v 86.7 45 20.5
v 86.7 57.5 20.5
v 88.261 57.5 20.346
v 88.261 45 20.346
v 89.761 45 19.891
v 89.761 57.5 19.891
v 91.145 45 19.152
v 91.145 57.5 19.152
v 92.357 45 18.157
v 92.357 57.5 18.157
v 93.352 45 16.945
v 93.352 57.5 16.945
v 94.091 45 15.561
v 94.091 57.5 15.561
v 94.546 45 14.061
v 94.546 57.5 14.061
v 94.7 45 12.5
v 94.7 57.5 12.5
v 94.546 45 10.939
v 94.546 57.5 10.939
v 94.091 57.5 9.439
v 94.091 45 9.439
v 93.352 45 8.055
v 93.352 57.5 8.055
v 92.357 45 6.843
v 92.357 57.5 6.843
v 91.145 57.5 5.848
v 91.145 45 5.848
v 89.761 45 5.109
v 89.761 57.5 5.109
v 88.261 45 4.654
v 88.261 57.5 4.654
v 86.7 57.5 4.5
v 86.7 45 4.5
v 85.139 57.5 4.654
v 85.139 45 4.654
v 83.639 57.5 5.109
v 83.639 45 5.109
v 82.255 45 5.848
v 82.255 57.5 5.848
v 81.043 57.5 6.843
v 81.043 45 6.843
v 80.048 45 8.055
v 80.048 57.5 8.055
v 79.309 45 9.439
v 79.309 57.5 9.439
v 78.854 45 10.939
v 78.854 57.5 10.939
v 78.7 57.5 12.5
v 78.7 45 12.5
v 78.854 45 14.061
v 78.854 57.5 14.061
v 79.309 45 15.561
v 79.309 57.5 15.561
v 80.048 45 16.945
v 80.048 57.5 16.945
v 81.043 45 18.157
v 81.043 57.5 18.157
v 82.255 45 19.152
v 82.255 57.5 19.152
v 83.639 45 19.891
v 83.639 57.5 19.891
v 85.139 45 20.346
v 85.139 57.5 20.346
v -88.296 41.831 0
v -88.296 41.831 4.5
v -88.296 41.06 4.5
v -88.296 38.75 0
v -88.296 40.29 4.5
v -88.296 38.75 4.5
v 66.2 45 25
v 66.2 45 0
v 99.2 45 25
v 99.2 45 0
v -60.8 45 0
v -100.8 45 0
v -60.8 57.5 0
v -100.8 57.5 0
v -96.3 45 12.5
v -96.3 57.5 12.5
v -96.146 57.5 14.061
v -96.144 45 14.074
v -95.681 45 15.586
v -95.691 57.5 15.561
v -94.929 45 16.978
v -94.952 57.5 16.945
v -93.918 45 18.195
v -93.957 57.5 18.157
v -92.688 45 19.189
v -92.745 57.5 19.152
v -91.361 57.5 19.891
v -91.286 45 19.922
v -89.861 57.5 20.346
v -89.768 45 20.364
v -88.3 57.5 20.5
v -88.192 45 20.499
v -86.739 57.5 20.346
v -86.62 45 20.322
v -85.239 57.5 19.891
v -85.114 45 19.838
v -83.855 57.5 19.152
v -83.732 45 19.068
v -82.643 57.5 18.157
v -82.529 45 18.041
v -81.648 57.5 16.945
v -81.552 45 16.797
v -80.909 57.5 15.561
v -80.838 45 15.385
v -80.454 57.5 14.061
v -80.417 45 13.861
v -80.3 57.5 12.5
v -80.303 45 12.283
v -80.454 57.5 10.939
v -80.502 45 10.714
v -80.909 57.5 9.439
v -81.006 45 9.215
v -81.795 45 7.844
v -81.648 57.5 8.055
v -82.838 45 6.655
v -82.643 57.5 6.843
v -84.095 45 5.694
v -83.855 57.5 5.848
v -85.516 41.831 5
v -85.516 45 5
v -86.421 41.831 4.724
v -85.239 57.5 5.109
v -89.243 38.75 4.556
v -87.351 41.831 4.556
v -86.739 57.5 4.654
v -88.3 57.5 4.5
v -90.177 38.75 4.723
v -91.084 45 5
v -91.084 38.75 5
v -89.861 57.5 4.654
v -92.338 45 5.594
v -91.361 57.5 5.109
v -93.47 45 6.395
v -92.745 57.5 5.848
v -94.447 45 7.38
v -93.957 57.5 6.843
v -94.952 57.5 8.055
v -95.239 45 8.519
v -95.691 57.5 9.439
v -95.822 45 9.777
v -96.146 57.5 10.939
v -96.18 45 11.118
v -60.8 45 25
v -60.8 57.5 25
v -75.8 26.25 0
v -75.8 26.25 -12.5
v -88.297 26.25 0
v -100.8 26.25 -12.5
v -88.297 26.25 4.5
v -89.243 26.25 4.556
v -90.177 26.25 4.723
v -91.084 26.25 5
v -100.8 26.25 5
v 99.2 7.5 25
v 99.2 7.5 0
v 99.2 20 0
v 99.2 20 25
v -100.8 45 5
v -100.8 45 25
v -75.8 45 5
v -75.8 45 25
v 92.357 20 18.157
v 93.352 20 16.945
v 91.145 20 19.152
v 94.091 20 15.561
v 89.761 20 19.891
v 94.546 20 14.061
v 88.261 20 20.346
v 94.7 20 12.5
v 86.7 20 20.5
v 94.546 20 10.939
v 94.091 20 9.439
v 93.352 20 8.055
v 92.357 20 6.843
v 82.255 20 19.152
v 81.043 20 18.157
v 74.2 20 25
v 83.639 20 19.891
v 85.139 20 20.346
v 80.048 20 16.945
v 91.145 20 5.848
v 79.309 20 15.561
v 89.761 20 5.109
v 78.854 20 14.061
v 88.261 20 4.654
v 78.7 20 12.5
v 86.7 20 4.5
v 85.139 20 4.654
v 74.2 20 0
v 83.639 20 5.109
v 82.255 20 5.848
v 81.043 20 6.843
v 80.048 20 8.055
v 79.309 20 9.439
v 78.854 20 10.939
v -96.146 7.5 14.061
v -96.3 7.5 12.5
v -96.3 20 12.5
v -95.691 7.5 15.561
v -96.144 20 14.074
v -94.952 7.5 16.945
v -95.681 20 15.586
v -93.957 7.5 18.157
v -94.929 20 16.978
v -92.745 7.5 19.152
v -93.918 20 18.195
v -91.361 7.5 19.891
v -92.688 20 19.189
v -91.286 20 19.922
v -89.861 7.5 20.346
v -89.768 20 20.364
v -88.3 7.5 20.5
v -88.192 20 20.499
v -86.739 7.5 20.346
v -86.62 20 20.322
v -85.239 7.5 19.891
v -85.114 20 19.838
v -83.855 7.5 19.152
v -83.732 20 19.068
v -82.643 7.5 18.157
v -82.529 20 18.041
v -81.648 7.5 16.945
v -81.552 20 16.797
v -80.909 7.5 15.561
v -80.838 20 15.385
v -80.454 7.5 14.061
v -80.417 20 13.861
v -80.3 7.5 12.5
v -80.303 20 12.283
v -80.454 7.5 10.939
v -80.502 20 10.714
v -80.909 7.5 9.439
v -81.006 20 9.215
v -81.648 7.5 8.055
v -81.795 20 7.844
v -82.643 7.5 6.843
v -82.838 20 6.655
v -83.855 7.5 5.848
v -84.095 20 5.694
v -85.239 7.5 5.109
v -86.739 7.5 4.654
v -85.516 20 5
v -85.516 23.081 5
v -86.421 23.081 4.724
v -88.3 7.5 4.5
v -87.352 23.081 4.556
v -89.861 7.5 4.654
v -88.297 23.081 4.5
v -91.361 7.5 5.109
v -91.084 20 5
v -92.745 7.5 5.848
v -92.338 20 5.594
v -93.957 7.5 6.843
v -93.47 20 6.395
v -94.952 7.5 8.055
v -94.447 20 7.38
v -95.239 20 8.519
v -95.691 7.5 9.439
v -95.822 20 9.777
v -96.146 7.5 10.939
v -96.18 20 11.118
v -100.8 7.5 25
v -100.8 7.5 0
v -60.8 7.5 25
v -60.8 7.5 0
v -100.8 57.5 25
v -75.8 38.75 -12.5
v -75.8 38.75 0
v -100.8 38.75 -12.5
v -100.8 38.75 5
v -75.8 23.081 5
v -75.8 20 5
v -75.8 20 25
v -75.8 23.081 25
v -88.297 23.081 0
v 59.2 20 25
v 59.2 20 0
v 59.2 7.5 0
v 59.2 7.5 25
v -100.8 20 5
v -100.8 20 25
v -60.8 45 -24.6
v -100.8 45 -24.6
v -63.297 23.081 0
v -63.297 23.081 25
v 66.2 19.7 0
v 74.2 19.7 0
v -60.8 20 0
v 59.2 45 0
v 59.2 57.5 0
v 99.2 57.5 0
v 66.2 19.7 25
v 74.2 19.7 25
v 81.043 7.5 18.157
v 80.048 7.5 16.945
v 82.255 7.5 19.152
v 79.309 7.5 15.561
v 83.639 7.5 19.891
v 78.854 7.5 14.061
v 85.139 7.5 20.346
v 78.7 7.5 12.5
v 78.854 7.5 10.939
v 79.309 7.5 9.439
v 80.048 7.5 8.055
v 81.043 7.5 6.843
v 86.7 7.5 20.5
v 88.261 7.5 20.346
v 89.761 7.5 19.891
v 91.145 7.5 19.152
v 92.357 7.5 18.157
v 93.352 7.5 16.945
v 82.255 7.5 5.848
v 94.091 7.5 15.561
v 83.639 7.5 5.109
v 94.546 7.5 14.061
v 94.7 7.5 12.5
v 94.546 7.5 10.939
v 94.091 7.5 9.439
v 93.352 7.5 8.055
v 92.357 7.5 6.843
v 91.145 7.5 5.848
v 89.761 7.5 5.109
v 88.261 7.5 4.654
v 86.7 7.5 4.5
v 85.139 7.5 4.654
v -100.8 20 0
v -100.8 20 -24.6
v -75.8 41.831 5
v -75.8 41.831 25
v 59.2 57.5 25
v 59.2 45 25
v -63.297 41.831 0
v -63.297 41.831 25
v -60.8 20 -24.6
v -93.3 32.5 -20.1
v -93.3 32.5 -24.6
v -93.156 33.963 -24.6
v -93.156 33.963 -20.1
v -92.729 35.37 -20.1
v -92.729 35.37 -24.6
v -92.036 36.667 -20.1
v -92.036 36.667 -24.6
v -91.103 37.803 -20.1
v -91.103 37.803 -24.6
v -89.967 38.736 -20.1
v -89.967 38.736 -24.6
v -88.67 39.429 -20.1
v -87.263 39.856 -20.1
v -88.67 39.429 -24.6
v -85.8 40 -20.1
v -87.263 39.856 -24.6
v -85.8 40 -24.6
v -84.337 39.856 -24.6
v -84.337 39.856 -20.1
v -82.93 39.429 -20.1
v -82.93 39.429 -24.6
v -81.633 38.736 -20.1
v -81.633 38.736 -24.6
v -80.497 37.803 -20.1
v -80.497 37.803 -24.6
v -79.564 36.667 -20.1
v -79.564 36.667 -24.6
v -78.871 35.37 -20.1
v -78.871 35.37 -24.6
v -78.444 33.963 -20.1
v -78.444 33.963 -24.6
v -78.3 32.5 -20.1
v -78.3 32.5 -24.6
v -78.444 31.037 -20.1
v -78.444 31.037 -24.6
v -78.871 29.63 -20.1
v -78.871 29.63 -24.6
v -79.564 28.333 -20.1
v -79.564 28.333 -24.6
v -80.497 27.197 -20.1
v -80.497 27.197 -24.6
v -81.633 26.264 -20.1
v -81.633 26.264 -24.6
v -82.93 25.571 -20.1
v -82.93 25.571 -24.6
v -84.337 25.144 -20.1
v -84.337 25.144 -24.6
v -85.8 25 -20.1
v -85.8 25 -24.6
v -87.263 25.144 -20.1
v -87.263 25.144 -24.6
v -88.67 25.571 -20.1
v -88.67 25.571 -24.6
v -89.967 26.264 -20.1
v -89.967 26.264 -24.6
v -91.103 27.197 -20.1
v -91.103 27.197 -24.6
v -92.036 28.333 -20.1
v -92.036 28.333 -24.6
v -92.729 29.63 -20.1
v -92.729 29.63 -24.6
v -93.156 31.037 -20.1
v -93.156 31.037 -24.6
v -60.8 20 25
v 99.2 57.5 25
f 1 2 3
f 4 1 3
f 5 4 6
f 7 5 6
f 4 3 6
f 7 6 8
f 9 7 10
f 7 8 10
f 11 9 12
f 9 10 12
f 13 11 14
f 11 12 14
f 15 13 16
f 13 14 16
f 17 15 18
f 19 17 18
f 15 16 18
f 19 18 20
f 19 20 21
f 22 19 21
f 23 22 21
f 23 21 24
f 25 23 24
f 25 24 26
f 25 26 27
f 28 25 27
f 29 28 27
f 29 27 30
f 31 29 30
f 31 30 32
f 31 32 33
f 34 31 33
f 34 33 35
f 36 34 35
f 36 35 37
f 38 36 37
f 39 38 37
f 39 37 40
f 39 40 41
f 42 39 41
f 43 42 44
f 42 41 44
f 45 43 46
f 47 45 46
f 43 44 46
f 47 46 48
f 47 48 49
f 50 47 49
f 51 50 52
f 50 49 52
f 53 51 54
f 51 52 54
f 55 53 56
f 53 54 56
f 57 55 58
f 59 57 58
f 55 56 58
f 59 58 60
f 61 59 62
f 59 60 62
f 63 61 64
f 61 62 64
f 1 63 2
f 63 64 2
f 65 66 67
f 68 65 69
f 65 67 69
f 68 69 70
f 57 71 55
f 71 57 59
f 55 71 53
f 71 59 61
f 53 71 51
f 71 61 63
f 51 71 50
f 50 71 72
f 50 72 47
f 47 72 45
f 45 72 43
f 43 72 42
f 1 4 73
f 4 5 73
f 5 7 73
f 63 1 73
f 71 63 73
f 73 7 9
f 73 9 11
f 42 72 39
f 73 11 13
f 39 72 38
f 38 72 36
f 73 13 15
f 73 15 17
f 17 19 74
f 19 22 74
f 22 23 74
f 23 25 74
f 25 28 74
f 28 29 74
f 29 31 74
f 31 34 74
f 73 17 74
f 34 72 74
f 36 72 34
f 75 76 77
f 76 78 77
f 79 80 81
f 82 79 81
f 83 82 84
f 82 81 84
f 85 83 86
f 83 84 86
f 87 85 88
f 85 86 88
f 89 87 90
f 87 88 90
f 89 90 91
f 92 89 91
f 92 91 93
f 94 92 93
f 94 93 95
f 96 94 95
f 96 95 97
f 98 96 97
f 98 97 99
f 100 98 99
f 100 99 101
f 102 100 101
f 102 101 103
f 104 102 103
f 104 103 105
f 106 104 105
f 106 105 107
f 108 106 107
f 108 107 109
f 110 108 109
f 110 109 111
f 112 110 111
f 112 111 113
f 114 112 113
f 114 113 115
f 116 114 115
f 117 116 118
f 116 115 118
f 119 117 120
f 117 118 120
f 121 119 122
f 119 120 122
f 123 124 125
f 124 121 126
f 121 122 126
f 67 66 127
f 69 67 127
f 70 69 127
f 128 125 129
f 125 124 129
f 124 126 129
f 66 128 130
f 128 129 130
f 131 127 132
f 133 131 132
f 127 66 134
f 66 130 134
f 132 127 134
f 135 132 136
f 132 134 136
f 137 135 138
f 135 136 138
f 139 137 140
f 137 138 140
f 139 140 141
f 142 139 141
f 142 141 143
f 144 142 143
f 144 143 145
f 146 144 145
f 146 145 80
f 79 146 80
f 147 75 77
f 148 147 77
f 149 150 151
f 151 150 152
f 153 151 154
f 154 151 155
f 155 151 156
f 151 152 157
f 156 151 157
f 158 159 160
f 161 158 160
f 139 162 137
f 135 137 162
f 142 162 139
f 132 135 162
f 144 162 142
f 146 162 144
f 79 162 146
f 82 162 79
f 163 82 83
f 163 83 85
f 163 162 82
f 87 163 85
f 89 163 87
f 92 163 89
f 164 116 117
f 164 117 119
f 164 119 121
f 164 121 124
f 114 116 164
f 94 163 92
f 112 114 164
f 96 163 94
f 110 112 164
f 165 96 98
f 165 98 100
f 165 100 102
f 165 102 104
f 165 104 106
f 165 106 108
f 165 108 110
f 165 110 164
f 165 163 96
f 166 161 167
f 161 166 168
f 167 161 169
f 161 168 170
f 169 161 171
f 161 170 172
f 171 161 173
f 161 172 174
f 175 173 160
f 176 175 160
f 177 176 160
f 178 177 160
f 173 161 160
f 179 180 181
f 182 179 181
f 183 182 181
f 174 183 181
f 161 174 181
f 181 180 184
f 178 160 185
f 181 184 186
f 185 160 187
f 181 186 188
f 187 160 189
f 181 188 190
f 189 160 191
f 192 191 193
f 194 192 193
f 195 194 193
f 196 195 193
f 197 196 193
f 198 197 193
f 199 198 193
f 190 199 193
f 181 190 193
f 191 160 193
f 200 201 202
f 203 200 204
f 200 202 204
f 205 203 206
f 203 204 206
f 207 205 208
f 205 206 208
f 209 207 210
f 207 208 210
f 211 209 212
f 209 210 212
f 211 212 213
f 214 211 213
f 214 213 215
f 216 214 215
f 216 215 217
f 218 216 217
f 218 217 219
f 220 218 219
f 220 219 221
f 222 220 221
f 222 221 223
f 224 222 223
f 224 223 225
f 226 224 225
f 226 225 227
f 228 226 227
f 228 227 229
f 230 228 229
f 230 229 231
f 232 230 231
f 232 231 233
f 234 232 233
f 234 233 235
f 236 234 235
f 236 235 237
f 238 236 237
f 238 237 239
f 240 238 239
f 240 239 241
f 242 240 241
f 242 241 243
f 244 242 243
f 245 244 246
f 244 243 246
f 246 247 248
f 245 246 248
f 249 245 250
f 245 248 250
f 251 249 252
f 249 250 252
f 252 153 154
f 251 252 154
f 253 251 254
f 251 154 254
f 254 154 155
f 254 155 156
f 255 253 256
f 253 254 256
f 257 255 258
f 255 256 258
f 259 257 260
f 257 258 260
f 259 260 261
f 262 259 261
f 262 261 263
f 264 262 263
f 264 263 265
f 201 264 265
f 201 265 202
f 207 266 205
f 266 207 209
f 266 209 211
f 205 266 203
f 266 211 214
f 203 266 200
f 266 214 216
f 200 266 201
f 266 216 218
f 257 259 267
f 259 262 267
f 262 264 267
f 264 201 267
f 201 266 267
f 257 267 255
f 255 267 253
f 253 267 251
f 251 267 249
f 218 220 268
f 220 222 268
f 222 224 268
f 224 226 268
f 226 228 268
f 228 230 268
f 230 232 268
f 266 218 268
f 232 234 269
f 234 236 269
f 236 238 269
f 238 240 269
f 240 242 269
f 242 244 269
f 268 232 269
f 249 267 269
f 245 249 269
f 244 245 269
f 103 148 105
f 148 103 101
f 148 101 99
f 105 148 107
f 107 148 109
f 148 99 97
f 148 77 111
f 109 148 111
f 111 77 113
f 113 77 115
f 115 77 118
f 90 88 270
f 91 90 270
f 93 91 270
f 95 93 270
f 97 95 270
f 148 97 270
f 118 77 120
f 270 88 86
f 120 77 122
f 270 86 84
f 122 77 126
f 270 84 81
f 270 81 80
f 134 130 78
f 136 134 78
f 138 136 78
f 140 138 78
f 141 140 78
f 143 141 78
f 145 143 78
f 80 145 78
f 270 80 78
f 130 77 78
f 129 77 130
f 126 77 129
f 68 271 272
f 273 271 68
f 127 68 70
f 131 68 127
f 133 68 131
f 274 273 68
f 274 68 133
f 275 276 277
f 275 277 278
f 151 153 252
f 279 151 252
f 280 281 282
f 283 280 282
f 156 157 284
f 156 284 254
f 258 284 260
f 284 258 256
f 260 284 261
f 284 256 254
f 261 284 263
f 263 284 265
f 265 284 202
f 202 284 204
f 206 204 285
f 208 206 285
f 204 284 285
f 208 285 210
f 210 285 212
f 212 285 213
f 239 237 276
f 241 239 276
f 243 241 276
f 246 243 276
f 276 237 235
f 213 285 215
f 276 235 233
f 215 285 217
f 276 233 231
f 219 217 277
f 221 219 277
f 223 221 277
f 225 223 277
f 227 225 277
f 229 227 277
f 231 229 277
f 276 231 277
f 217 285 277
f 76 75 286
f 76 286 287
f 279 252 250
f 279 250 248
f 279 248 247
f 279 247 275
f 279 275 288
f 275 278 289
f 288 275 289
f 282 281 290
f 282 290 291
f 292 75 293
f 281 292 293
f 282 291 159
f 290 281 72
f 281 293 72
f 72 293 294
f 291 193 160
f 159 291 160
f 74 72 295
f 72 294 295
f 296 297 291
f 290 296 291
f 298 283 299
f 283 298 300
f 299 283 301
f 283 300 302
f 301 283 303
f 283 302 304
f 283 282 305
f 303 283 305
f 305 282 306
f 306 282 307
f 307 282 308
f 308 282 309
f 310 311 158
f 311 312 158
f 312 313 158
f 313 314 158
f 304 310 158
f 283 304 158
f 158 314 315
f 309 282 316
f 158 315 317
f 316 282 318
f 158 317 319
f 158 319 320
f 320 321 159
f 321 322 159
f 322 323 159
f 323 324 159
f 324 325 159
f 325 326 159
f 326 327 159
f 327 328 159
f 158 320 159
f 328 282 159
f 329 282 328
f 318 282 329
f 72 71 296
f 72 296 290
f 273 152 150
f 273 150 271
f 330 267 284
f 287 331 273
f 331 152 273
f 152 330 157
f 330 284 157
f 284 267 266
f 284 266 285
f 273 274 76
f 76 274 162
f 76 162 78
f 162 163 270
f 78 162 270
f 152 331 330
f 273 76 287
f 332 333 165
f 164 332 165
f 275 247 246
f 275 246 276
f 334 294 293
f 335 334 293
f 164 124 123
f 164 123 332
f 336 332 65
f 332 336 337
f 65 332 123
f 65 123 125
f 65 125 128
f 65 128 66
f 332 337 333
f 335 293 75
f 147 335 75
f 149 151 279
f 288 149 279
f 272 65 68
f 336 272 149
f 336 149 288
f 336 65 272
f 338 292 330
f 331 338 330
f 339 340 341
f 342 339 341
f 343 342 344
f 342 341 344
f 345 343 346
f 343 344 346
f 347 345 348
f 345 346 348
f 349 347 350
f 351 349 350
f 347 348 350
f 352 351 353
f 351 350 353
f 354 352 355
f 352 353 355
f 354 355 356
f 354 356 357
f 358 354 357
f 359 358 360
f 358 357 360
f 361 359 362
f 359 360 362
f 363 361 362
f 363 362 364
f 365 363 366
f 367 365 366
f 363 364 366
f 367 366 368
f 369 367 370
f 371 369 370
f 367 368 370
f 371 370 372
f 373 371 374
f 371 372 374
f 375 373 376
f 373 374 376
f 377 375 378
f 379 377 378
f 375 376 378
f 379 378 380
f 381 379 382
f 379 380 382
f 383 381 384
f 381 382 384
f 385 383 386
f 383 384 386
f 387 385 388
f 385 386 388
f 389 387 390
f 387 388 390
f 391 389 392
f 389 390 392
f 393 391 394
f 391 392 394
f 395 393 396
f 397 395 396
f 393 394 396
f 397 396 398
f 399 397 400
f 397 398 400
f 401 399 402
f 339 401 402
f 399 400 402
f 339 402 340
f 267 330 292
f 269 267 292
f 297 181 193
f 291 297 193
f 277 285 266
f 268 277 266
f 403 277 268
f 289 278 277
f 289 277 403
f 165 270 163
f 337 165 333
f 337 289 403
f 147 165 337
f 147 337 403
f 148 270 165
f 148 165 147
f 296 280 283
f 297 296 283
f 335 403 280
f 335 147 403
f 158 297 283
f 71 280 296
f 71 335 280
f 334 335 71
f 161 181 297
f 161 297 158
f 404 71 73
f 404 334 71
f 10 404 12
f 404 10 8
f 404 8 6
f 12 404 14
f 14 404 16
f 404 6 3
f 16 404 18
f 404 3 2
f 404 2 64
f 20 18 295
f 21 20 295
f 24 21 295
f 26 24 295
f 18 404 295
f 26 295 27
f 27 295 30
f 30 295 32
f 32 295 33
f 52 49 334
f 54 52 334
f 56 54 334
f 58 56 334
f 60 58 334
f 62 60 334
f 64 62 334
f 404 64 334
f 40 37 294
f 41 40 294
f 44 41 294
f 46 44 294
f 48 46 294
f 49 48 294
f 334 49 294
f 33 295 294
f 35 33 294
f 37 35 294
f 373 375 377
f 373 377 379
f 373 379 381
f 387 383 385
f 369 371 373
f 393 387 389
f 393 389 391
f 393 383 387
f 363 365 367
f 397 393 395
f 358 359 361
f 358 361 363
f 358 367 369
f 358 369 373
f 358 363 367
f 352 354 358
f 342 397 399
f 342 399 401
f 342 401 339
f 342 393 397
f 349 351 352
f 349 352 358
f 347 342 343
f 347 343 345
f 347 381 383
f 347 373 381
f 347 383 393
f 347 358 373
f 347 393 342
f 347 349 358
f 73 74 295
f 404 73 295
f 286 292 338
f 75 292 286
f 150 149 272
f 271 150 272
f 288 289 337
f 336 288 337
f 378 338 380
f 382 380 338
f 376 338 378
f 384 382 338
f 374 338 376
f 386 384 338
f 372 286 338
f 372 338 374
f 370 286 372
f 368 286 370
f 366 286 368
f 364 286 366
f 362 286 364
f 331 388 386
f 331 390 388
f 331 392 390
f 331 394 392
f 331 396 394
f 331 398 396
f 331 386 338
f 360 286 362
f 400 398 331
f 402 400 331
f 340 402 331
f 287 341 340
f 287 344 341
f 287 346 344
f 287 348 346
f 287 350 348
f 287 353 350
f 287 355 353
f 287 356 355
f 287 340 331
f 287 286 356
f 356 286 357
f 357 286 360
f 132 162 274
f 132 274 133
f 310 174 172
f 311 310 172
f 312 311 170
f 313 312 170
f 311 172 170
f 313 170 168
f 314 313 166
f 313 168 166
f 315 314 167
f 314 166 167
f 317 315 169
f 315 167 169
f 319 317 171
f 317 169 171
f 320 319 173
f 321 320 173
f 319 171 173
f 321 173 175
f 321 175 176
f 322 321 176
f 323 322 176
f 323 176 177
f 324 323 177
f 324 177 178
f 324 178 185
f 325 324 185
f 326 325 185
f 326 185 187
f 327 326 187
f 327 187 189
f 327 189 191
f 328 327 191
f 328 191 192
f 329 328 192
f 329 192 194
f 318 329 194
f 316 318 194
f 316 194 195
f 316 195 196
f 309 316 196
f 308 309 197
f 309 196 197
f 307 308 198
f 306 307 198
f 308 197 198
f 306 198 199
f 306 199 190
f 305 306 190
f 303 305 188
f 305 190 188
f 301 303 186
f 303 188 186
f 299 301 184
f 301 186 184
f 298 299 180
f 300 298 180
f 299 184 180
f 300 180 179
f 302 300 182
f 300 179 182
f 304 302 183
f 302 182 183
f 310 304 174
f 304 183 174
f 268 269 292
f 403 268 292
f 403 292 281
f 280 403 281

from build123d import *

# Parameters (mm, degrees)
BOSS_EXTRUDE1_DEPTH = 25
SKETCH2_R           = 8
CUT_EXTRUDE1_DEPTH  = 70.5
SKETCH3_R           = 8
CUT_EXTRUDE2_DEPTH  = 88
SKETCH4_W           = 40
SKETCH4_H           = 25
BOSS_EXTRUDE2_DEPTH = 24.6
SKETCH5_R           = 7.5
CUT_EXTRUDE4_DEPTH  = 4.5
SKETCH7_W           = 25
SKETCH7_H           = 25
CUT_EXTRUDE6_DEPTH  = 20
SKETCH10_W          = 25
SKETCH10_H          = 12.5
CUT_EXTRUDE7_DEPTH  = 25
SKETCH13_W          = 12.503220776
SKETCH13_H          = 18.75
CUT_EXTRUDE9_DEPTH  = 25
SKETCH17_W          = 25
SKETCH17_H          = 25.299748734
CUT_EXTRUDE11_DEPTH = 8


with BuildPart() as part:
    # Sketch1 → Boss-Extrude1 (new body)
    with BuildSketch(Plane.XY):
        Polygon((59.2, 45), (-60.8, 45), (-60.8, 57.5), (-100.8, 57.5), (-100.8, 45), (-100.8, 20), (-100.8, 7.5), (-60.8, 7.5), (-60.8, 20), (59.2, 20), (59.2, 7.5), (99.2, 7.5), (99.2, 20), (74.2, 20), (74.2, 45), (99.2, 45), (99.2, 57.5), (59.2, 57.5), align=None)
    extrude(amount=BOSS_EXTRUDE1_DEPTH)

    # Sketch2 → Cut-Extrude1 (cut)
    with BuildSketch(Plane(origin=(0, 57.5, 0), x_dir=(1, 0, 0), z_dir=(0, 1, 0))):
        with Locations(Location((-88.3, -12.5, 0), (0, 0, 180))):
            Circle(SKETCH2_R)
    extrude(amount=-CUT_EXTRUDE1_DEPTH, mode=Mode.SUBTRACT)

    # Sketch3 → Cut-Extrude2 (cut)
    with BuildSketch(Plane(origin=(0, 57.5, 0), x_dir=(1, 0, 0), z_dir=(0, 1, 0))):
        with Locations(Location((86.7, -12.5, 0), (0, 0, 270))):
            Circle(SKETCH3_R)
    extrude(amount=-CUT_EXTRUDE2_DEPTH, mode=Mode.SUBTRACT)

    # Sketch4 → Boss-Extrude2 (add)
    with BuildSketch(Plane(origin=(0, 0, 0), x_dir=(-1, 0, 0), z_dir=(0, 0, -1))):
        with Locations((80.8, 32.5)):
            Rectangle(SKETCH4_W, SKETCH4_H)
    extrude(amount=BOSS_EXTRUDE2_DEPTH)

    # Sketch5 → Cut-Extrude4 (cut)
    with BuildSketch(Plane(origin=(0, 0, -24.6), x_dir=(-1, 0, 0), z_dir=(0, 0, -1))):
        with Locations((85.8, 32.5)):
            Circle(SKETCH5_R)
    extrude(amount=-CUT_EXTRUDE4_DEPTH, mode=Mode.SUBTRACT)

    # Sketch7 → Cut-Extrude6 (cut)
    with BuildSketch(Plane.XY.offset(25)):
        with Locations((-88.3, 32.5)):
            Rectangle(SKETCH7_W, SKETCH7_H)
    extrude(amount=-CUT_EXTRUDE6_DEPTH, mode=Mode.SUBTRACT)

    # Sketch10 → Cut-Extrude7 (cut)
    with BuildSketch(Plane.ZY.offset(100.8)):
        with Locations((0, 32.5)):
            Rectangle(SKETCH10_W, SKETCH10_H)
    extrude(amount=-CUT_EXTRUDE7_DEPTH, mode=Mode.SUBTRACT)

    # Sketch13 → Cut-Extrude9 (cut)
    with BuildSketch(Plane.XY.offset(25)):
        Polygon((-88.295569288, 41.830666142), (-88.296779224, 32.455666142), (-88.296779224, 23.080666142), (-75.8, 23.080666142), (-75.8, 41.830666142), align=None)
        with Locations((-69.548389612, 32.455666142)):
            Rectangle(SKETCH13_W, SKETCH13_H)
    extrude(amount=-CUT_EXTRUDE9_DEPTH, mode=Mode.SUBTRACT)

    # Sketch17 → Cut-Extrude11 (cut)
    with BuildSketch(Plane(origin=(74.2, 0, 0), x_dir=(0, 0, -1), z_dir=(1, 0, 0))):
        with Locations((-12.5, 32.350125633)):
            Rectangle(SKETCH17_W, SKETCH17_H)
    extrude(amount=-CUT_EXTRUDE11_DEPTH, mode=Mode.SUBTRACT)


solid = part.part
